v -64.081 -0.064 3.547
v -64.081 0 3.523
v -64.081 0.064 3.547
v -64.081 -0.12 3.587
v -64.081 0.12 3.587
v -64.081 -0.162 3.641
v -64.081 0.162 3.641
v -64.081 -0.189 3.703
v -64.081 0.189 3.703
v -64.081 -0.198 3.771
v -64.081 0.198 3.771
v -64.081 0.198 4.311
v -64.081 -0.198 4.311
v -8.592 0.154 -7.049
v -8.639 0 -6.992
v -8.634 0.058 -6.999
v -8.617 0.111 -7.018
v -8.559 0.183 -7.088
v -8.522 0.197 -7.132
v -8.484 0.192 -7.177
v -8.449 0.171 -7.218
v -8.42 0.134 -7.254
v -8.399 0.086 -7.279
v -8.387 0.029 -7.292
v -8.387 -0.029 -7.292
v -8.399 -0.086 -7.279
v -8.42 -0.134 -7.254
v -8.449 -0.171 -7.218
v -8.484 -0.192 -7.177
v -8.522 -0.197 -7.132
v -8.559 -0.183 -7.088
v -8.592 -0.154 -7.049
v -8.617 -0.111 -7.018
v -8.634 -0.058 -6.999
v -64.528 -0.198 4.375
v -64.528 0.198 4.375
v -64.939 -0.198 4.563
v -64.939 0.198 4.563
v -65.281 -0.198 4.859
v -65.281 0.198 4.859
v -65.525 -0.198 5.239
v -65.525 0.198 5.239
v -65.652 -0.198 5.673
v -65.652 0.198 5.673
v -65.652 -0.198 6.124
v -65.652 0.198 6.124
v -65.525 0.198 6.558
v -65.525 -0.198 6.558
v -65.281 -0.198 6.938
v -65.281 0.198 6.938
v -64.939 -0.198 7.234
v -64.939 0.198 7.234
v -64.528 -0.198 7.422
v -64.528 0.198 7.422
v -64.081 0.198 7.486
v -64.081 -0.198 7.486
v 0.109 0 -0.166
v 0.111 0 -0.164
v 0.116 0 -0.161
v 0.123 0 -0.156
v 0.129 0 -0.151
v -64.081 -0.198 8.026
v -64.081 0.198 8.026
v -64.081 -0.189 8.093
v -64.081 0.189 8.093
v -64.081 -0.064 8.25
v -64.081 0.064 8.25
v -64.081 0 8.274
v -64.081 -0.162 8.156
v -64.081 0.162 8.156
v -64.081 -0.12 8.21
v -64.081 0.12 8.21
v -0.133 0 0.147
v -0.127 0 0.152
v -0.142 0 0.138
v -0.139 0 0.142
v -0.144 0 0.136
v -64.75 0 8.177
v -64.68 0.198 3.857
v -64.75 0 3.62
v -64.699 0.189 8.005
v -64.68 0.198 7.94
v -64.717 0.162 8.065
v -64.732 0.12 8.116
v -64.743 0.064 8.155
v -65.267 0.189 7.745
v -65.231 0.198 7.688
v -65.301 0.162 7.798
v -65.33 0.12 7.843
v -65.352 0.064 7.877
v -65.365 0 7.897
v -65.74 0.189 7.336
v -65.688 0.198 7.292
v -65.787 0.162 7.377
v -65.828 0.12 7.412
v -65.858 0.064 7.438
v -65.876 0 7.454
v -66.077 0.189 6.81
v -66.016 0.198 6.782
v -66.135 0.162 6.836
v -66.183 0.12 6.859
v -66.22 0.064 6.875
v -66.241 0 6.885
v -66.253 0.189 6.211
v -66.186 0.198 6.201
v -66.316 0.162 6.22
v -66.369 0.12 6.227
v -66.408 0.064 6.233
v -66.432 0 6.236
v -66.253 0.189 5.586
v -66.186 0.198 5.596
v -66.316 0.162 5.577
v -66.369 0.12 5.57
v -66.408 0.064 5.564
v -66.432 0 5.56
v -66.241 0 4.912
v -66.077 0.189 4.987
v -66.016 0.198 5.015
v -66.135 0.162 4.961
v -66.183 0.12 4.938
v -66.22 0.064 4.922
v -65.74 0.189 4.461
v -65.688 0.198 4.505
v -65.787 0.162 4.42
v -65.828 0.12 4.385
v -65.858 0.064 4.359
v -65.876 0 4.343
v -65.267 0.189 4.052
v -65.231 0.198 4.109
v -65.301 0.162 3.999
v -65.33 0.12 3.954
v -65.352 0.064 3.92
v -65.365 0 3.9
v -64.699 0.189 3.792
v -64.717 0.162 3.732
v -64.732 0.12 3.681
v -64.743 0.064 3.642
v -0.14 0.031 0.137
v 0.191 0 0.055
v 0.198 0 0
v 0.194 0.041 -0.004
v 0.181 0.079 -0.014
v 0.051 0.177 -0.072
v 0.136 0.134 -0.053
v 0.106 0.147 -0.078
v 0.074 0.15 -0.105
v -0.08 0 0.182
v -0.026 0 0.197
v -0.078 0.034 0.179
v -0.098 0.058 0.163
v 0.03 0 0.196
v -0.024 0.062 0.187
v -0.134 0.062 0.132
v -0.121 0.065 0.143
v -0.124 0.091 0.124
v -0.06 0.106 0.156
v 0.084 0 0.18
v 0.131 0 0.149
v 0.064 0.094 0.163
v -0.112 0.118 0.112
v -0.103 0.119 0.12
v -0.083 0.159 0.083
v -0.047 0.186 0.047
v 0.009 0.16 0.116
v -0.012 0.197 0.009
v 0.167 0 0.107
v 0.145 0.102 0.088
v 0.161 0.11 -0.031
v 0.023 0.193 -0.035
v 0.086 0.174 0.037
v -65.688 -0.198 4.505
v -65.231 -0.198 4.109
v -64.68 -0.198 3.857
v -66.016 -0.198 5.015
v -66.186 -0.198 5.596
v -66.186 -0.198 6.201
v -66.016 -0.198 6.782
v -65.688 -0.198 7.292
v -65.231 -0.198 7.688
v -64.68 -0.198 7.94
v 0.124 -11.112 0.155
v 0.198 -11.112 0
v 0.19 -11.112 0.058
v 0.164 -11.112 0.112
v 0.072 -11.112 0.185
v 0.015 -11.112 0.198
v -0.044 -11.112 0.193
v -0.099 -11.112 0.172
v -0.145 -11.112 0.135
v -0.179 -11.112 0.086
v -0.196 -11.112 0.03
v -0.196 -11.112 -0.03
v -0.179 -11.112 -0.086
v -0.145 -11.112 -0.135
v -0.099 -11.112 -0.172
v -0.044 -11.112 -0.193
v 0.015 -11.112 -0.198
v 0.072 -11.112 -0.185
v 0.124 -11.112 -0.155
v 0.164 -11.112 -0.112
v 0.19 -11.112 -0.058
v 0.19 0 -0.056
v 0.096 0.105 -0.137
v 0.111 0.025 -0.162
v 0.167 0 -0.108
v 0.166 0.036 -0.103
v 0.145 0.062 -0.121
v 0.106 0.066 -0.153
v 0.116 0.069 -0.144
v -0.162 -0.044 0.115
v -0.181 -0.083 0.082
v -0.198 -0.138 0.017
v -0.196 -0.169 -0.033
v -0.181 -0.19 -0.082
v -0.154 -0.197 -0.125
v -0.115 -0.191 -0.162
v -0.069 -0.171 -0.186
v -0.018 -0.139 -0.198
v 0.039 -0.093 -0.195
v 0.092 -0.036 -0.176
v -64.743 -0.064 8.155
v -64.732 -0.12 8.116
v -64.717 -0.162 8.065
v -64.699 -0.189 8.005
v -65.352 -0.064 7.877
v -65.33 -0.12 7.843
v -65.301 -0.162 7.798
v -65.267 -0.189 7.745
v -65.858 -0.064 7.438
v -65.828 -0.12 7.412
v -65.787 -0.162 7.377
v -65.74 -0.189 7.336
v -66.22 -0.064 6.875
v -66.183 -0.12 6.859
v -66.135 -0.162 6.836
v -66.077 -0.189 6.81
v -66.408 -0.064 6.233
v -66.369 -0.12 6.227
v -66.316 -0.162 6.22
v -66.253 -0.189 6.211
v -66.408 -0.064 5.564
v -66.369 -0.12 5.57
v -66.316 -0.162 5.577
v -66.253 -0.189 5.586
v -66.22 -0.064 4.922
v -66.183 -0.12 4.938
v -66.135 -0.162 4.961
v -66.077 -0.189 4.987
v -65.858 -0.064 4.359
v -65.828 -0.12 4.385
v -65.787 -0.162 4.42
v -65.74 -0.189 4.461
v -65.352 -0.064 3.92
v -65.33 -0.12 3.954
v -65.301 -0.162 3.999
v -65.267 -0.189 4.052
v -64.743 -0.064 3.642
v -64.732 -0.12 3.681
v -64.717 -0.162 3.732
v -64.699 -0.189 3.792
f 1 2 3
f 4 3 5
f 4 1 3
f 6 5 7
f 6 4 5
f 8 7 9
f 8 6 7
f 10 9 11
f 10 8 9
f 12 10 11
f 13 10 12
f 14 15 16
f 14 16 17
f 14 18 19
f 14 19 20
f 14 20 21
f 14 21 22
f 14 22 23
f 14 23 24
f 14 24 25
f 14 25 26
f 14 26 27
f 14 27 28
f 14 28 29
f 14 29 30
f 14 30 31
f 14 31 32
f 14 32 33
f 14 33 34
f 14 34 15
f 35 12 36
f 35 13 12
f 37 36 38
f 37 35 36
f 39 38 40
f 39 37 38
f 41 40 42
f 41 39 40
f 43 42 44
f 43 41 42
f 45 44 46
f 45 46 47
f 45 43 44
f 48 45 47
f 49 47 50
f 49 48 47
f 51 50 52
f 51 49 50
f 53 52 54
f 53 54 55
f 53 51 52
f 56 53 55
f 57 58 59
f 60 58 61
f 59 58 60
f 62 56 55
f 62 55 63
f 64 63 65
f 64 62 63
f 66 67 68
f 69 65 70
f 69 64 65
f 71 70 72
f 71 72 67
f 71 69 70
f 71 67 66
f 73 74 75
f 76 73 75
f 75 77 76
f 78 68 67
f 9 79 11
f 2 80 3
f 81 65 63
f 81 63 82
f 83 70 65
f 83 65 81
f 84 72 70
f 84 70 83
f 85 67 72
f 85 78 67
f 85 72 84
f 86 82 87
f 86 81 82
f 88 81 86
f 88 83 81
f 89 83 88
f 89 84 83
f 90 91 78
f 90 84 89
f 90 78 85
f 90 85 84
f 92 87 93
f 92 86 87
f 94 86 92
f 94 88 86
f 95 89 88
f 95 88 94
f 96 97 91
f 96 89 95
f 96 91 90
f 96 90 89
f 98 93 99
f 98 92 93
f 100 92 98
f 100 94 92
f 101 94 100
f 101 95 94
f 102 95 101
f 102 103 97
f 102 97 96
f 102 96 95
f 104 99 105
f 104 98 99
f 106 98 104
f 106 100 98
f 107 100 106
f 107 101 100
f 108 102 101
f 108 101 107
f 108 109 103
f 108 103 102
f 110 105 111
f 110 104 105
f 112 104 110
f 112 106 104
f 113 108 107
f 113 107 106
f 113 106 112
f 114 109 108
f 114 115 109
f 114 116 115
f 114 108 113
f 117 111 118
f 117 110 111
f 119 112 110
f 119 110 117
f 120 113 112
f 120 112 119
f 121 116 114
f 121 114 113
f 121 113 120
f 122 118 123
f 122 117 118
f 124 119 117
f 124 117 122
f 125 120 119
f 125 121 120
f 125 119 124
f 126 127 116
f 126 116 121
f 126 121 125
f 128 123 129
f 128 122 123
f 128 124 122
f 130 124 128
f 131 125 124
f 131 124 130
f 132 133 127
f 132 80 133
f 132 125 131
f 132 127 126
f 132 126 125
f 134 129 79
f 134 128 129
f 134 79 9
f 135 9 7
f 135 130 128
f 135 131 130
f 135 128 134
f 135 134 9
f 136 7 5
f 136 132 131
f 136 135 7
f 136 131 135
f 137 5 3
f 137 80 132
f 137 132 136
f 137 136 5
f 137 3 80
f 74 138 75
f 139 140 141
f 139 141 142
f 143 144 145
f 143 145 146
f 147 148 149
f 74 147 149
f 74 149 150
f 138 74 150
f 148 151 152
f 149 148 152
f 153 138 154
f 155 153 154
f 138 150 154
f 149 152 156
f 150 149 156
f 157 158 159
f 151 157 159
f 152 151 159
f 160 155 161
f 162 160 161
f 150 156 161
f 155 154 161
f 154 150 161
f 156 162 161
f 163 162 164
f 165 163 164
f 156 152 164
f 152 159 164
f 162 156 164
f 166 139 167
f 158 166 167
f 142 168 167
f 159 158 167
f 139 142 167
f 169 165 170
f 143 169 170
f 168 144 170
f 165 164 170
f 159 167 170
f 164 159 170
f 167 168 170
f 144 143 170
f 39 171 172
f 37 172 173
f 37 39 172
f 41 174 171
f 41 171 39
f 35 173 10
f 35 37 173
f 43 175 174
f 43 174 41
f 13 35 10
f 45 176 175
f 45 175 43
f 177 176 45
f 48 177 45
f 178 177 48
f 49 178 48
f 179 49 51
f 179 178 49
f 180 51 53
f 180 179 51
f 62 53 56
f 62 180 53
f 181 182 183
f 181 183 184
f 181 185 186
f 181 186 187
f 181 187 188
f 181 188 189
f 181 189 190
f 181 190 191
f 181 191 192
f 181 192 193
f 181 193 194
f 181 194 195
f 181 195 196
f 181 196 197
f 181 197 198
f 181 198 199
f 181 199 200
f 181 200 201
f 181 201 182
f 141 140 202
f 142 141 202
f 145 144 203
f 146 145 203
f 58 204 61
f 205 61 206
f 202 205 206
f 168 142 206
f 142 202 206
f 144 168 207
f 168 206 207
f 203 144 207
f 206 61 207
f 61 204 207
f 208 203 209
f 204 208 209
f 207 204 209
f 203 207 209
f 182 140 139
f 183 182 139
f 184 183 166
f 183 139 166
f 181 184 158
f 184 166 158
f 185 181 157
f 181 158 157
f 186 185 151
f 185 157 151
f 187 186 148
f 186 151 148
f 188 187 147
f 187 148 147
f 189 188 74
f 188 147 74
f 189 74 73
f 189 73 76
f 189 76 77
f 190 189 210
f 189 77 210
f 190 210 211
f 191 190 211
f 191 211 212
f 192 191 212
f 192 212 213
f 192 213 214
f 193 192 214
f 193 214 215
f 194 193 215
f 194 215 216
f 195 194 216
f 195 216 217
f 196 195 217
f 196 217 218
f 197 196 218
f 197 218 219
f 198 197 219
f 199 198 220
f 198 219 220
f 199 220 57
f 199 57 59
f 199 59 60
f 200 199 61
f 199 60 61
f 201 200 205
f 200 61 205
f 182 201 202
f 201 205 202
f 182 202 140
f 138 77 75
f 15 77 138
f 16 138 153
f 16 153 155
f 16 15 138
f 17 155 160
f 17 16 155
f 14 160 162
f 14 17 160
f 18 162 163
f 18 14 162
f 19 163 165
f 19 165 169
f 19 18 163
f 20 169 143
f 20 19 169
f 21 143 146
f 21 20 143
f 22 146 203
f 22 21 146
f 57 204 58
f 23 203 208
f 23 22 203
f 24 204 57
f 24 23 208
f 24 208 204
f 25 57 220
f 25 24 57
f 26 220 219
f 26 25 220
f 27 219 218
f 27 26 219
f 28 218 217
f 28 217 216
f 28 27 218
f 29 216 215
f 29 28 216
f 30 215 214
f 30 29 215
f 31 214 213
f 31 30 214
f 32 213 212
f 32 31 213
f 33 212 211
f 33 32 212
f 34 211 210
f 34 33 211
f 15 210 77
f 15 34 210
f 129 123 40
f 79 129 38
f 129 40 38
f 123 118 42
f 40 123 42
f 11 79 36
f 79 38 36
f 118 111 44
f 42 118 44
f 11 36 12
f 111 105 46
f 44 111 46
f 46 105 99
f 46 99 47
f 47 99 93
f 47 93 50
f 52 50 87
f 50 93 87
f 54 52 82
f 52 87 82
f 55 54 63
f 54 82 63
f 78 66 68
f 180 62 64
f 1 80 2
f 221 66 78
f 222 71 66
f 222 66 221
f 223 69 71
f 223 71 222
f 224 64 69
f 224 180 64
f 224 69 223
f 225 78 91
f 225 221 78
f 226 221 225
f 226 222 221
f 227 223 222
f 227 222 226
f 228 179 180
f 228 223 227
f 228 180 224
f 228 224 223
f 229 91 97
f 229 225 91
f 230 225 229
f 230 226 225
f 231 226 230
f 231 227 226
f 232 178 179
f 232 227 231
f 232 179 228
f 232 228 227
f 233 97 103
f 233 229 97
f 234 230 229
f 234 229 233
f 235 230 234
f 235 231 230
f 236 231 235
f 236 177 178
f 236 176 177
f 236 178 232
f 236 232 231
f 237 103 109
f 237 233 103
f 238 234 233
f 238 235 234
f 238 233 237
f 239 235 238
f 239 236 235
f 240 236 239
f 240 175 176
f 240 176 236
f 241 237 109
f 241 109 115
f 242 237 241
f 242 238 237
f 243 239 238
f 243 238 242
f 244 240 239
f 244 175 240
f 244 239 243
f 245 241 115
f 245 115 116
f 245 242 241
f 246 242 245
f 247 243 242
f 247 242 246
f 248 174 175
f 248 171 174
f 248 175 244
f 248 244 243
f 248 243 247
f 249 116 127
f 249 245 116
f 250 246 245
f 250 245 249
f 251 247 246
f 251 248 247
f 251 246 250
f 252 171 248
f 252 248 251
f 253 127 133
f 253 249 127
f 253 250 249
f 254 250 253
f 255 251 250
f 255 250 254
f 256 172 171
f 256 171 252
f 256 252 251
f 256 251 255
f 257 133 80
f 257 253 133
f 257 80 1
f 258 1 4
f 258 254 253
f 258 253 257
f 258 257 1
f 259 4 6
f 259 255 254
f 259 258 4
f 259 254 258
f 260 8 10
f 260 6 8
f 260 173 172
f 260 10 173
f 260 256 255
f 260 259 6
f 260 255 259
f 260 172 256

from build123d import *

# Parameters (mm, degrees)
F0_R          = 0.1984375
F1_DEPTH      = 11.1125
F6_DEPTH      = 0.1984375
F6_DEPTH_BACK = 0.1984375
F7_T2_ANGLE   = 210.6068917121
F7_T4_ANGLE   = 210.6068917121


# Not quite as in the source:
# - a fillet or chamfer that OpenCascade refuses, or shapes differently, is made with other operations: its cross-section is extruded or revolved along the edge and cut away or added


with BuildPart() as f1:
    # F0 (on Front) → F1 (new body)
    with BuildSketch(Plane.XZ):
        Circle(F0_R)
    extrude(amount=F1_DEPTH)

    # F2 (on Front) → F3 (revolve)
    with BuildSketch(Plane.XZ):
        Polygon((-8.5126688742, -7.1429773126), (0, 0), (-0.1267016231, 0.1509971145), (-8.6393704972, -6.9919801982), align=None)
    revolve(axis=Axis((-4.2563344371, 0, -3.5714886563), (-0.7660444431, 0, -0.6427876097)))

    # F4 (on face) → F5 (revolve)
    with BuildSketch(Plane(origin=(0, 0, 0), x_dir=(-1, 0, 0), z_dir=(0, 1, 0))):
        with BuildLine():
            ThreePointArc((-0.1984375, 0), (-0.1802970974, -0.0828878645), (-0.129192543, -0.1506211414))
            Line((-0.129192543, -0.1506211414), (0.1272588737, 0.1522584003))
            ThreePointArc((0.1272588737, 0.1522584003), (-0.0840372199, 0.1797642542), (-0.1984375, 0))
        make_face()
    revolve(axis=Axis((0.0009668347, 0, 0.0008186295), (-0.6461899668, 0, 0.7631766027)))


with BuildPart() as f6:
    # F2 (on Front) → F6 (new body, two sides)
    with BuildSketch(Plane.XZ) as f6_sk:
        with BuildLine():
            Line((-64.0807822347, 7.4859789066), (-64.0807822347, 8.2797289066))
            ThreePointArc((-64.0807822347, 8.2797289066), (-66.4620322347, 5.8984789066), (-64.0807822347, 3.5172289066))
            Line((-64.0807822347, 3.5172289066), (-64.0807822347, 4.3109789066))
            ThreePointArc((-64.0807822347, 4.3109789066), (-65.6682822347, 5.8984789066), (-64.0807822347, 7.4859789066))
        make_face()
    extrude(amount=F6_DEPTH)
    extrude(f6_sk.sketch, amount=-F6_DEPTH_BACK)

    # F7: fillet of radius 0.254 on 2 edges, made by hand

    # F7_s1 → F7_t2 (revolve, cut)
    with BuildSketch(Plane(origin=(-61.1185306696, 0, 16.7240888712), x_dir=(0, 1, 0), z_dir=(0.964541547, 0, -0.2639310595))):
        with BuildLine():
            ThreePointArc((0.0555625, -8.8423307762), (-0.1240426224, -8.9167256538), (-0.1984375, -9.0963307762))
            Line((-0.1984375, -9.0963307762), (-0.1984375, -8.8423307762))
            Line((-0.1984375, -8.8423307762), (0.0555625, -8.8423307762))
        make_face()
    revolve(axis=Axis((-64.0807822347, -0.1984375, 5.8984789066), (0, -1, 0)), revolution_arc=F7_T2_ANGLE, mode=Mode.SUBTRACT)

    # F7_s3 → F7_t4 (revolve, cut)
    with BuildSketch(Plane(origin=(-61.1185306696, 0, 16.7240888712), x_dir=(0, 1, 0), z_dir=(0.964541547, 0, -0.2639310595))):
        with BuildLine():
            ThreePointArc((0.1984375, -9.0963307762), (0.1240426224, -8.9167256538), (-0.0555625, -8.8423307762))
            Line((-0.0555625, -8.8423307762), (0.1984375, -8.8423307762))
            Line((0.1984375, -8.8423307762), (0.1984375, -9.0963307762))
        make_face()
    revolve(axis=Axis((-64.0807822347, 0.1984375, 5.8984789066), (0, -1, 0)), revolution_arc=F7_T4_ANGLE, mode=Mode.SUBTRACT)


solid = Compound([f1.part, f6.part])
